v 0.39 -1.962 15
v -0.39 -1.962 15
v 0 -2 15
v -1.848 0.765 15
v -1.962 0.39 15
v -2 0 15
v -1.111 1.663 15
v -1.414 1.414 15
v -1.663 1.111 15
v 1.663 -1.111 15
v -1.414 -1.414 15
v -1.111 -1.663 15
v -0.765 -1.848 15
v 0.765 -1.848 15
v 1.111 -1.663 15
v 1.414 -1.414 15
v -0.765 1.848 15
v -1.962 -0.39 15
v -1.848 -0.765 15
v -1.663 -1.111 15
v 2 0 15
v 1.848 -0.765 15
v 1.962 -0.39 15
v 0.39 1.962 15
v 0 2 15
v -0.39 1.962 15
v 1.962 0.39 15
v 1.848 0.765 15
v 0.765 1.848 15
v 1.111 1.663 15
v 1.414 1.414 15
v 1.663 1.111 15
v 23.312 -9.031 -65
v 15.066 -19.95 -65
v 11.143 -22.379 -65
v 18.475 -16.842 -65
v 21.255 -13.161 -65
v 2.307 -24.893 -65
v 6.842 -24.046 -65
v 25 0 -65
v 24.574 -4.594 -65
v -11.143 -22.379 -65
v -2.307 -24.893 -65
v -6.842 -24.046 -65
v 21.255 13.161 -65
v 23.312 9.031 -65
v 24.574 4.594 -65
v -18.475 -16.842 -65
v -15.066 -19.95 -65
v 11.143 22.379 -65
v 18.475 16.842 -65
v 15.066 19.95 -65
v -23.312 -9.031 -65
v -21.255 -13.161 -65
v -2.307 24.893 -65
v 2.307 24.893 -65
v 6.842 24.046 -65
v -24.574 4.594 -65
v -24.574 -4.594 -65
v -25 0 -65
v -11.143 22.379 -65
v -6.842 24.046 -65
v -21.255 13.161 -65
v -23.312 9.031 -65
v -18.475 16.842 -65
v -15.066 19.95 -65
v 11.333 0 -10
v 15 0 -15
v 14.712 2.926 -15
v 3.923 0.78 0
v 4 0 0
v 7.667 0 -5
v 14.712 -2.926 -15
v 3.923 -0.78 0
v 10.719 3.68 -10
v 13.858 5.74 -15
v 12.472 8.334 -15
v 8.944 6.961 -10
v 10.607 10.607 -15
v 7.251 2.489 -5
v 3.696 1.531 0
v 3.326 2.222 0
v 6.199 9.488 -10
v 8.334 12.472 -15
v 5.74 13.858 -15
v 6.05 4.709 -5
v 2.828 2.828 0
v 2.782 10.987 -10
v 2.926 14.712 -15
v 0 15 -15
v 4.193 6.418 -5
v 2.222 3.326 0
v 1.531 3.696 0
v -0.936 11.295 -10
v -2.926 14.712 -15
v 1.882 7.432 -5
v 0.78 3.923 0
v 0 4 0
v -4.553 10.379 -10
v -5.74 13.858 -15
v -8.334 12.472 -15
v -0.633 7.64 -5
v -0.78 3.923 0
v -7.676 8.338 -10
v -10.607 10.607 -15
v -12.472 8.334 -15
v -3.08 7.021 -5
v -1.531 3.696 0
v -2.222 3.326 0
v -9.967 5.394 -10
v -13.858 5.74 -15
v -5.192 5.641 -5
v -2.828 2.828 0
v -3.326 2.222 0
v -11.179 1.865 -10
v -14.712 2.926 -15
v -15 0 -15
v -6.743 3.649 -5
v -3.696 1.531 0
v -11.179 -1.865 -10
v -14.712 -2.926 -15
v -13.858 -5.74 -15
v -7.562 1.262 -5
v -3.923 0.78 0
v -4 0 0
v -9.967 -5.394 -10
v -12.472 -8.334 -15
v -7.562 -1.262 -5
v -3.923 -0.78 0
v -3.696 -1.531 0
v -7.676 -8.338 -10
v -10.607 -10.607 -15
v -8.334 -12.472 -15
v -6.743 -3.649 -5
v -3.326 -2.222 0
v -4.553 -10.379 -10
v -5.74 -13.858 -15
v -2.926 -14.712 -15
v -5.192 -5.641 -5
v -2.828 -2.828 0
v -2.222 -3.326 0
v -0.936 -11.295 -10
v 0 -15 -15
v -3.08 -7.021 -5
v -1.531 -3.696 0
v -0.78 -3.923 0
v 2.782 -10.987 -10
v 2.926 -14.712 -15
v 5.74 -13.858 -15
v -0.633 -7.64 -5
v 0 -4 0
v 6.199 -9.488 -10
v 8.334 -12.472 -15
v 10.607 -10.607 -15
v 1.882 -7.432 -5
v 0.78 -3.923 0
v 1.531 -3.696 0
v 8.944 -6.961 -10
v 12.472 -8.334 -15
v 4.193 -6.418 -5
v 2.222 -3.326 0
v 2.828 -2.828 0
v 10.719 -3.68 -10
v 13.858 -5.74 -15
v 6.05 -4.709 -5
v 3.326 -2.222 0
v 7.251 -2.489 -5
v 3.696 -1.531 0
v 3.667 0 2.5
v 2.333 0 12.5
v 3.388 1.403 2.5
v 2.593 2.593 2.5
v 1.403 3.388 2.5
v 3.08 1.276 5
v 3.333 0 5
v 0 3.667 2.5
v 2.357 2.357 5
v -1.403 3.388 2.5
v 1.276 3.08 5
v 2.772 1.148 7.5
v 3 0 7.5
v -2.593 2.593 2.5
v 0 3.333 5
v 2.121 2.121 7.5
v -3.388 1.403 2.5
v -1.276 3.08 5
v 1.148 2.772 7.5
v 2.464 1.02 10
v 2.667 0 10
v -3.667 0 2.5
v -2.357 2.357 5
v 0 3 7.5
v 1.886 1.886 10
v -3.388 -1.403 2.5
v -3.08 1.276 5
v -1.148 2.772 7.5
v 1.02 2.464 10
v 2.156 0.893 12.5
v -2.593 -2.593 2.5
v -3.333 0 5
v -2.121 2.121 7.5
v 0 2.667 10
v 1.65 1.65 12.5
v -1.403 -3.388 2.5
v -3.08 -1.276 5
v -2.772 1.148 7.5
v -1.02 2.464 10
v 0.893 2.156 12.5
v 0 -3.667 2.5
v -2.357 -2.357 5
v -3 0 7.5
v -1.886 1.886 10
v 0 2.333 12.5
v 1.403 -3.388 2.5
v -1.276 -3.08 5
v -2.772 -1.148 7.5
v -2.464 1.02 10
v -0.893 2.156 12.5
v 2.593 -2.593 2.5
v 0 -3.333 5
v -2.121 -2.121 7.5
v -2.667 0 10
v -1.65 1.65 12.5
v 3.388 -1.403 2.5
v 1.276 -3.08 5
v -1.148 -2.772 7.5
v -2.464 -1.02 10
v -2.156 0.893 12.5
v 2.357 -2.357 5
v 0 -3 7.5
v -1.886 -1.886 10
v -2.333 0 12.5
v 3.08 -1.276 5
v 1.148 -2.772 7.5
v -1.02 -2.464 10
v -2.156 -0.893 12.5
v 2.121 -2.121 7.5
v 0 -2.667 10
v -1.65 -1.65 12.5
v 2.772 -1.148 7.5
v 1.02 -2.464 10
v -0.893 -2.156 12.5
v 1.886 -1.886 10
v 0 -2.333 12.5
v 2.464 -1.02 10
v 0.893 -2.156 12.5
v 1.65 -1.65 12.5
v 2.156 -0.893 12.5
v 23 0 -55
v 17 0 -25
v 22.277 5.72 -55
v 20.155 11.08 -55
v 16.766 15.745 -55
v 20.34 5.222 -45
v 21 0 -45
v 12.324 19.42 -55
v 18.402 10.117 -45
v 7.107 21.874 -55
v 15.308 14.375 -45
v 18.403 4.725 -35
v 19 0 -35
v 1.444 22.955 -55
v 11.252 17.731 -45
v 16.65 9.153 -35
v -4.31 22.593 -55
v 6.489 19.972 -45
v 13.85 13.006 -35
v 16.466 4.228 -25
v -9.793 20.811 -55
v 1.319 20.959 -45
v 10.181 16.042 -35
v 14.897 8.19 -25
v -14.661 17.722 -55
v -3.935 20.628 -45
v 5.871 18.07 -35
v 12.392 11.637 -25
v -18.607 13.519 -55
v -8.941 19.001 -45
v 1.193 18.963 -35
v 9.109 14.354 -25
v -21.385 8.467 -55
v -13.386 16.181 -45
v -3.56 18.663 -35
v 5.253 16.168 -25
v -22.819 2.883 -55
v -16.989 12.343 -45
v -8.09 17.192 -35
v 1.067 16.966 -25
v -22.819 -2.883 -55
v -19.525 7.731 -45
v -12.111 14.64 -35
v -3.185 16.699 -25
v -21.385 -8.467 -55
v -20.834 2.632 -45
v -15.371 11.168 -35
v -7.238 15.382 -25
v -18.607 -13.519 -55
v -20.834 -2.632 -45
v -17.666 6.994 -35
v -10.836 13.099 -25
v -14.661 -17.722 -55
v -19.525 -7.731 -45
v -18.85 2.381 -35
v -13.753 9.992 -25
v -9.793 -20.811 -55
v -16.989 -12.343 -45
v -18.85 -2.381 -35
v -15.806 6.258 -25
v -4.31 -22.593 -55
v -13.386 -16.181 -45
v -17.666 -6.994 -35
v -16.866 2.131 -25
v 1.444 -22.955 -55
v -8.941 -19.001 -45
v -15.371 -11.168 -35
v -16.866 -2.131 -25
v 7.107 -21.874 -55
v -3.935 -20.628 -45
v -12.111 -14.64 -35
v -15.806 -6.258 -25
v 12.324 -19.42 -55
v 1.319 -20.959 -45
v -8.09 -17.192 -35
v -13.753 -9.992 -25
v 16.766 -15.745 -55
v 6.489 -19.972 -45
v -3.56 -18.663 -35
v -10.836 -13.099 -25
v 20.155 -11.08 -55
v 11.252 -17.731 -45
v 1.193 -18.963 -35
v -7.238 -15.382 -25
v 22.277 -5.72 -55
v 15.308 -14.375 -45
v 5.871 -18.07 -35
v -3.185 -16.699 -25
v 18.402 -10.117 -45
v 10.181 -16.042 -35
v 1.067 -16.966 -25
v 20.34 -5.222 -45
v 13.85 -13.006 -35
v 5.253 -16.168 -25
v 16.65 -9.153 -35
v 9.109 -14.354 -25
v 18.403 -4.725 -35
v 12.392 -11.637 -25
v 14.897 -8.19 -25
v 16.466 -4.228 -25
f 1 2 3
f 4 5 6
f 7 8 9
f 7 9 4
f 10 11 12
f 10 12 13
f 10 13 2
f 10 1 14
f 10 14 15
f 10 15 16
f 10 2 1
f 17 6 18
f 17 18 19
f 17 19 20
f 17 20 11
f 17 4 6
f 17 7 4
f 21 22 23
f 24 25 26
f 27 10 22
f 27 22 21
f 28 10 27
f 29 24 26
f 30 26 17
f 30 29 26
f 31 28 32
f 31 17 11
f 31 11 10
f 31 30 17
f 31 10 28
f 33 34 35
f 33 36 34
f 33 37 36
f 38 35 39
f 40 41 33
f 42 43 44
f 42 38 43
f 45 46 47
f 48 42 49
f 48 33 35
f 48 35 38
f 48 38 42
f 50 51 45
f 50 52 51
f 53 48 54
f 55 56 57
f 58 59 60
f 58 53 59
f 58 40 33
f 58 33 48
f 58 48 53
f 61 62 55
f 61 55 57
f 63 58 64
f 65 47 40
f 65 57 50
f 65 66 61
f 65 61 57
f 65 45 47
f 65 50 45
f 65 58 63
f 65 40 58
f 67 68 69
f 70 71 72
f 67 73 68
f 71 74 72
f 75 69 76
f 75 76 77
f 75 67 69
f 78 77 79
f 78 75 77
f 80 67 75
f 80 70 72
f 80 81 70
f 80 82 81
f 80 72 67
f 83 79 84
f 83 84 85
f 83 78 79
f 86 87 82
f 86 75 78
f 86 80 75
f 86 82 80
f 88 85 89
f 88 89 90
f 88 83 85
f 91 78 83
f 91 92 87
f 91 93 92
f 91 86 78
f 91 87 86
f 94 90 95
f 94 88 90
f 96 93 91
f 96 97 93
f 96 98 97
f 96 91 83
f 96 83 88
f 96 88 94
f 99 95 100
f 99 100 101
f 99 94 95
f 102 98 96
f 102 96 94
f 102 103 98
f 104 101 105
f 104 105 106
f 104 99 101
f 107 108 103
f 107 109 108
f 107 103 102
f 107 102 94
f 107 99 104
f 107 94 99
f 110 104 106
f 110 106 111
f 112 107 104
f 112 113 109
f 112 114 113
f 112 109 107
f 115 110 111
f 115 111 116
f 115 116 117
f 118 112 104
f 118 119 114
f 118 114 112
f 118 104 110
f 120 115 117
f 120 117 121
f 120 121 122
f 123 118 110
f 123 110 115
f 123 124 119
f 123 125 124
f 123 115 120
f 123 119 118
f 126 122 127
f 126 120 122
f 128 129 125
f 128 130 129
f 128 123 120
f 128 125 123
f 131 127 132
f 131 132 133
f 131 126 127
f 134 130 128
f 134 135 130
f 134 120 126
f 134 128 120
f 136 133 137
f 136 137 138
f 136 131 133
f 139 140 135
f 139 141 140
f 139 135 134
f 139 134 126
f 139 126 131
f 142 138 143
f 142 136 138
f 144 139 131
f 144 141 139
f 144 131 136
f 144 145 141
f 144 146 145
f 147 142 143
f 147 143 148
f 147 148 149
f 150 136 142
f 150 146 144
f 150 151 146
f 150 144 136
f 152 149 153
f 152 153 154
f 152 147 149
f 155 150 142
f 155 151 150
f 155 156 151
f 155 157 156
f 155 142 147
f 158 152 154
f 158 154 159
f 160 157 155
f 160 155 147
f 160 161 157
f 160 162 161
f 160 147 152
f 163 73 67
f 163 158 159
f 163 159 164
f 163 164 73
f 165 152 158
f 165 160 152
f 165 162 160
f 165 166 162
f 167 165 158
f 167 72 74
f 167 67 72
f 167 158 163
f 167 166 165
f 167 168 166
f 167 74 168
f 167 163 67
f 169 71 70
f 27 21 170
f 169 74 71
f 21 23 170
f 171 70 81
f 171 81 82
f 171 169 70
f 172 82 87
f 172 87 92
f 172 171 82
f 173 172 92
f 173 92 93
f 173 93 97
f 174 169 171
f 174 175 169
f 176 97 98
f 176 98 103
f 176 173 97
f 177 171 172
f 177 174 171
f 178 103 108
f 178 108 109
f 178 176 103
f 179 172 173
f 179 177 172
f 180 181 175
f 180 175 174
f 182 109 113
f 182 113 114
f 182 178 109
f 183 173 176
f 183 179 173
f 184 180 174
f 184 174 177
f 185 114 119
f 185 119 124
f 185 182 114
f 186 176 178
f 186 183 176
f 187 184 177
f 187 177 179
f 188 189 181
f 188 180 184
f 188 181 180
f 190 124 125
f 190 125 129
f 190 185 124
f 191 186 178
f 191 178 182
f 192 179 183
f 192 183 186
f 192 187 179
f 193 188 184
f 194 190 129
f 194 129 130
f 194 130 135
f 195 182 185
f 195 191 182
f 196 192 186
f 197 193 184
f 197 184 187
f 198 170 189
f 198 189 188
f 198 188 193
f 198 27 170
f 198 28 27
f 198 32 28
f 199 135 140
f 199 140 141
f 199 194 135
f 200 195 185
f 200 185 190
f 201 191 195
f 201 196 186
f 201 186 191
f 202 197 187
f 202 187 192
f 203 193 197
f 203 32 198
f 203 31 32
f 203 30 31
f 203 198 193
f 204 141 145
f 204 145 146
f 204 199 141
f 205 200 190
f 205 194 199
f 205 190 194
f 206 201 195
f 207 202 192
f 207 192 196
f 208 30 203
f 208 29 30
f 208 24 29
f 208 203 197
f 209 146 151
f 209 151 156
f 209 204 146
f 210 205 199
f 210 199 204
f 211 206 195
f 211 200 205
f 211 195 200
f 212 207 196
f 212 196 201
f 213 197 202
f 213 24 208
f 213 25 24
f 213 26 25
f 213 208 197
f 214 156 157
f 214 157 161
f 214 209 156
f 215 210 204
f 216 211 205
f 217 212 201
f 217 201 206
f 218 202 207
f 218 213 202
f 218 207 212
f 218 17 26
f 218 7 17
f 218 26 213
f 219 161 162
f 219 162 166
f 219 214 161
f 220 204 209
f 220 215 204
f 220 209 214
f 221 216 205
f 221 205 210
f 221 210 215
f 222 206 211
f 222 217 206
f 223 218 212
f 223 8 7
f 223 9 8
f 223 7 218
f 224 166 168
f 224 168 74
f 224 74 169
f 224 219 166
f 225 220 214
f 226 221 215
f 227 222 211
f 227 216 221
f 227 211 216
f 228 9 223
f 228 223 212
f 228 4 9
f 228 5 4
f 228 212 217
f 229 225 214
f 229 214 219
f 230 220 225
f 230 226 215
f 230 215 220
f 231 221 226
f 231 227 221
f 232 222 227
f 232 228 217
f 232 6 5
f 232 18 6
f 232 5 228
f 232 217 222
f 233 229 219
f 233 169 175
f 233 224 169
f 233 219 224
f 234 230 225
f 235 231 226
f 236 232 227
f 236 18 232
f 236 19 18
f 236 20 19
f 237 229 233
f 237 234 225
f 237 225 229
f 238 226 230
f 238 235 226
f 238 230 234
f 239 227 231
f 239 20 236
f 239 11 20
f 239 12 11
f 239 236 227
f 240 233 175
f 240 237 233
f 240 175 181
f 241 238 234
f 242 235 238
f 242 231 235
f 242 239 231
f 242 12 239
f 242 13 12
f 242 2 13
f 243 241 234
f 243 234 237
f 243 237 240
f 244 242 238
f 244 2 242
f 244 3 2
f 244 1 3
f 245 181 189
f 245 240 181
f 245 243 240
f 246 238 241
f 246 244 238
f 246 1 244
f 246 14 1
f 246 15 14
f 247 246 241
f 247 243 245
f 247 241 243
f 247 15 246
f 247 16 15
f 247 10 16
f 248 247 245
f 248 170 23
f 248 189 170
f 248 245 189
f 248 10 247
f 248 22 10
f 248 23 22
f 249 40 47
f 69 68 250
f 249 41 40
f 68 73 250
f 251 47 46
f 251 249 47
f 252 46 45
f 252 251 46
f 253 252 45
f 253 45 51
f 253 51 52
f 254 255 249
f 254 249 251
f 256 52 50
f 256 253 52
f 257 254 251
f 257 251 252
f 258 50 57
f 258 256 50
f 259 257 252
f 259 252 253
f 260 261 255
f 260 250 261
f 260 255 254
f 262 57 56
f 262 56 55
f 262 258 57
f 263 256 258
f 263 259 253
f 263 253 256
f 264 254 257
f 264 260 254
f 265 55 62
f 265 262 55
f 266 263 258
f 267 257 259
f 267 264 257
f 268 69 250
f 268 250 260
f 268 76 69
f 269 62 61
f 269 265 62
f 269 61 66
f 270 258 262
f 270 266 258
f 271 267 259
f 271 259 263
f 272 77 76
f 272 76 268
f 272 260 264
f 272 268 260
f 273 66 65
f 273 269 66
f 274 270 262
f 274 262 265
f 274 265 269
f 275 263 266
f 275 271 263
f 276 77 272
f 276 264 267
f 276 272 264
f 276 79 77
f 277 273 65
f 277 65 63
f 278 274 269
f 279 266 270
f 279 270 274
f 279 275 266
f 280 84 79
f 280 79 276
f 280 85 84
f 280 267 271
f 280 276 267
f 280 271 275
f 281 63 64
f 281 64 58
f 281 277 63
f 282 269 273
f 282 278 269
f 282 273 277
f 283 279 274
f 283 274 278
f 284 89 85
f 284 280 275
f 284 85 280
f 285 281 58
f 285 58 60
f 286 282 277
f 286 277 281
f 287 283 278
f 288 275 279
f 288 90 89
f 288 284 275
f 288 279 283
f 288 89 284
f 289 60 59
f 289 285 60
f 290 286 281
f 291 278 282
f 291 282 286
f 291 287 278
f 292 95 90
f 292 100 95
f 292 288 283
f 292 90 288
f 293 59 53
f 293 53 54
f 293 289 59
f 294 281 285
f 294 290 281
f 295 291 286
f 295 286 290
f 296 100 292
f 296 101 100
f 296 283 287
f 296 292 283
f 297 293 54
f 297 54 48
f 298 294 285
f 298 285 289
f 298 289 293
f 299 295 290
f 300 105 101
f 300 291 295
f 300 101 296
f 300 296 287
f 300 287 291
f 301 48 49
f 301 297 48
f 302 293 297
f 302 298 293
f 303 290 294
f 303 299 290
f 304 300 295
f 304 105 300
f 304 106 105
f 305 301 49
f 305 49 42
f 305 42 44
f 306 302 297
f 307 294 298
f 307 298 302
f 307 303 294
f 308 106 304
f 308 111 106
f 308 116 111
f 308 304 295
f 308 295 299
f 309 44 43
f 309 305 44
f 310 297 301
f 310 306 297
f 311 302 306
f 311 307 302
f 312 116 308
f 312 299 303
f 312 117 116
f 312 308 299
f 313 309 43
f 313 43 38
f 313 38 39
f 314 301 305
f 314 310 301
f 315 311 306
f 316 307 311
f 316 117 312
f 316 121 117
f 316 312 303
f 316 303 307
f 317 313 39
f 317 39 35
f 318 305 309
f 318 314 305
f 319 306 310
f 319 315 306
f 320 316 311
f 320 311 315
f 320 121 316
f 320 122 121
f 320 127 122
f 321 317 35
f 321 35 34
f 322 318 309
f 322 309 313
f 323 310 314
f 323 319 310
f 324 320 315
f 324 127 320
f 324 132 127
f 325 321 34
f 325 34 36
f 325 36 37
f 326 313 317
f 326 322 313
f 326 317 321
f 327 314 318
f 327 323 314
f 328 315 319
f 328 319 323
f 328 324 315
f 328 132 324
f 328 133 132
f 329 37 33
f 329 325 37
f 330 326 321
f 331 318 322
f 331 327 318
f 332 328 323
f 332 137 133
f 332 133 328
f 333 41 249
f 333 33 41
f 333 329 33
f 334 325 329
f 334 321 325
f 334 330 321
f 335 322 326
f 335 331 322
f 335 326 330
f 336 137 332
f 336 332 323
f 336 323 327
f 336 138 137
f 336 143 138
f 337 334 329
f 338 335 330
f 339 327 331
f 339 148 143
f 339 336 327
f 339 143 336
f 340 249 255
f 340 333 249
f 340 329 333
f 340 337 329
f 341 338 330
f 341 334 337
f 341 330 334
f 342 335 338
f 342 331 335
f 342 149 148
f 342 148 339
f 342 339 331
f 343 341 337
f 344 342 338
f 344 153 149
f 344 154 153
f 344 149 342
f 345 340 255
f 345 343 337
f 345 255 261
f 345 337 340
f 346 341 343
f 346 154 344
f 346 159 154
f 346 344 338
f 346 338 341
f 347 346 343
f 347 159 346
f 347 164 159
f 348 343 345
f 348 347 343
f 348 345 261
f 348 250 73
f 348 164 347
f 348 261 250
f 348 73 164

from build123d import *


with BuildPart() as cone001:
    # Cone001 → Cone001 (revolve)
    with BuildSketch(Plane(origin=(0, 0, -15), x_dir=(1, 0, 0), z_dir=(0, -1, 0))):
        Polygon((0, 0), (15, 0), (4, 15), (0, 15), align=None)
    revolve(axis=Axis((0, 0, -15), (0, 0, 1)))


with BuildPart() as cone002:
    # Cone002 → Cone002 (revolve)
    with BuildSketch(Plane(origin=(0, 0, -65), x_dir=(1, 0, 0), z_dir=(0, -1, 0))):
        Polygon((0, 0), (25, 0), (15, 50), (0, 50), align=None)
    revolve(axis=Axis((0, 0, -65), (0, 0, 1)))


with BuildPart() as fusion:
    # Cone → Cone (revolve)
    with BuildSketch(Plane.XZ):
        Polygon((0, 0), (4, 0), (2, 15), (0, 15), align=None)
    revolve(axis=Axis((0, 0, 0), (0, 0, 1)))

    # Fusion: union Cone001, Cone002
    add(cone001.part)
    add(cone002.part)


solid = fusion.part
